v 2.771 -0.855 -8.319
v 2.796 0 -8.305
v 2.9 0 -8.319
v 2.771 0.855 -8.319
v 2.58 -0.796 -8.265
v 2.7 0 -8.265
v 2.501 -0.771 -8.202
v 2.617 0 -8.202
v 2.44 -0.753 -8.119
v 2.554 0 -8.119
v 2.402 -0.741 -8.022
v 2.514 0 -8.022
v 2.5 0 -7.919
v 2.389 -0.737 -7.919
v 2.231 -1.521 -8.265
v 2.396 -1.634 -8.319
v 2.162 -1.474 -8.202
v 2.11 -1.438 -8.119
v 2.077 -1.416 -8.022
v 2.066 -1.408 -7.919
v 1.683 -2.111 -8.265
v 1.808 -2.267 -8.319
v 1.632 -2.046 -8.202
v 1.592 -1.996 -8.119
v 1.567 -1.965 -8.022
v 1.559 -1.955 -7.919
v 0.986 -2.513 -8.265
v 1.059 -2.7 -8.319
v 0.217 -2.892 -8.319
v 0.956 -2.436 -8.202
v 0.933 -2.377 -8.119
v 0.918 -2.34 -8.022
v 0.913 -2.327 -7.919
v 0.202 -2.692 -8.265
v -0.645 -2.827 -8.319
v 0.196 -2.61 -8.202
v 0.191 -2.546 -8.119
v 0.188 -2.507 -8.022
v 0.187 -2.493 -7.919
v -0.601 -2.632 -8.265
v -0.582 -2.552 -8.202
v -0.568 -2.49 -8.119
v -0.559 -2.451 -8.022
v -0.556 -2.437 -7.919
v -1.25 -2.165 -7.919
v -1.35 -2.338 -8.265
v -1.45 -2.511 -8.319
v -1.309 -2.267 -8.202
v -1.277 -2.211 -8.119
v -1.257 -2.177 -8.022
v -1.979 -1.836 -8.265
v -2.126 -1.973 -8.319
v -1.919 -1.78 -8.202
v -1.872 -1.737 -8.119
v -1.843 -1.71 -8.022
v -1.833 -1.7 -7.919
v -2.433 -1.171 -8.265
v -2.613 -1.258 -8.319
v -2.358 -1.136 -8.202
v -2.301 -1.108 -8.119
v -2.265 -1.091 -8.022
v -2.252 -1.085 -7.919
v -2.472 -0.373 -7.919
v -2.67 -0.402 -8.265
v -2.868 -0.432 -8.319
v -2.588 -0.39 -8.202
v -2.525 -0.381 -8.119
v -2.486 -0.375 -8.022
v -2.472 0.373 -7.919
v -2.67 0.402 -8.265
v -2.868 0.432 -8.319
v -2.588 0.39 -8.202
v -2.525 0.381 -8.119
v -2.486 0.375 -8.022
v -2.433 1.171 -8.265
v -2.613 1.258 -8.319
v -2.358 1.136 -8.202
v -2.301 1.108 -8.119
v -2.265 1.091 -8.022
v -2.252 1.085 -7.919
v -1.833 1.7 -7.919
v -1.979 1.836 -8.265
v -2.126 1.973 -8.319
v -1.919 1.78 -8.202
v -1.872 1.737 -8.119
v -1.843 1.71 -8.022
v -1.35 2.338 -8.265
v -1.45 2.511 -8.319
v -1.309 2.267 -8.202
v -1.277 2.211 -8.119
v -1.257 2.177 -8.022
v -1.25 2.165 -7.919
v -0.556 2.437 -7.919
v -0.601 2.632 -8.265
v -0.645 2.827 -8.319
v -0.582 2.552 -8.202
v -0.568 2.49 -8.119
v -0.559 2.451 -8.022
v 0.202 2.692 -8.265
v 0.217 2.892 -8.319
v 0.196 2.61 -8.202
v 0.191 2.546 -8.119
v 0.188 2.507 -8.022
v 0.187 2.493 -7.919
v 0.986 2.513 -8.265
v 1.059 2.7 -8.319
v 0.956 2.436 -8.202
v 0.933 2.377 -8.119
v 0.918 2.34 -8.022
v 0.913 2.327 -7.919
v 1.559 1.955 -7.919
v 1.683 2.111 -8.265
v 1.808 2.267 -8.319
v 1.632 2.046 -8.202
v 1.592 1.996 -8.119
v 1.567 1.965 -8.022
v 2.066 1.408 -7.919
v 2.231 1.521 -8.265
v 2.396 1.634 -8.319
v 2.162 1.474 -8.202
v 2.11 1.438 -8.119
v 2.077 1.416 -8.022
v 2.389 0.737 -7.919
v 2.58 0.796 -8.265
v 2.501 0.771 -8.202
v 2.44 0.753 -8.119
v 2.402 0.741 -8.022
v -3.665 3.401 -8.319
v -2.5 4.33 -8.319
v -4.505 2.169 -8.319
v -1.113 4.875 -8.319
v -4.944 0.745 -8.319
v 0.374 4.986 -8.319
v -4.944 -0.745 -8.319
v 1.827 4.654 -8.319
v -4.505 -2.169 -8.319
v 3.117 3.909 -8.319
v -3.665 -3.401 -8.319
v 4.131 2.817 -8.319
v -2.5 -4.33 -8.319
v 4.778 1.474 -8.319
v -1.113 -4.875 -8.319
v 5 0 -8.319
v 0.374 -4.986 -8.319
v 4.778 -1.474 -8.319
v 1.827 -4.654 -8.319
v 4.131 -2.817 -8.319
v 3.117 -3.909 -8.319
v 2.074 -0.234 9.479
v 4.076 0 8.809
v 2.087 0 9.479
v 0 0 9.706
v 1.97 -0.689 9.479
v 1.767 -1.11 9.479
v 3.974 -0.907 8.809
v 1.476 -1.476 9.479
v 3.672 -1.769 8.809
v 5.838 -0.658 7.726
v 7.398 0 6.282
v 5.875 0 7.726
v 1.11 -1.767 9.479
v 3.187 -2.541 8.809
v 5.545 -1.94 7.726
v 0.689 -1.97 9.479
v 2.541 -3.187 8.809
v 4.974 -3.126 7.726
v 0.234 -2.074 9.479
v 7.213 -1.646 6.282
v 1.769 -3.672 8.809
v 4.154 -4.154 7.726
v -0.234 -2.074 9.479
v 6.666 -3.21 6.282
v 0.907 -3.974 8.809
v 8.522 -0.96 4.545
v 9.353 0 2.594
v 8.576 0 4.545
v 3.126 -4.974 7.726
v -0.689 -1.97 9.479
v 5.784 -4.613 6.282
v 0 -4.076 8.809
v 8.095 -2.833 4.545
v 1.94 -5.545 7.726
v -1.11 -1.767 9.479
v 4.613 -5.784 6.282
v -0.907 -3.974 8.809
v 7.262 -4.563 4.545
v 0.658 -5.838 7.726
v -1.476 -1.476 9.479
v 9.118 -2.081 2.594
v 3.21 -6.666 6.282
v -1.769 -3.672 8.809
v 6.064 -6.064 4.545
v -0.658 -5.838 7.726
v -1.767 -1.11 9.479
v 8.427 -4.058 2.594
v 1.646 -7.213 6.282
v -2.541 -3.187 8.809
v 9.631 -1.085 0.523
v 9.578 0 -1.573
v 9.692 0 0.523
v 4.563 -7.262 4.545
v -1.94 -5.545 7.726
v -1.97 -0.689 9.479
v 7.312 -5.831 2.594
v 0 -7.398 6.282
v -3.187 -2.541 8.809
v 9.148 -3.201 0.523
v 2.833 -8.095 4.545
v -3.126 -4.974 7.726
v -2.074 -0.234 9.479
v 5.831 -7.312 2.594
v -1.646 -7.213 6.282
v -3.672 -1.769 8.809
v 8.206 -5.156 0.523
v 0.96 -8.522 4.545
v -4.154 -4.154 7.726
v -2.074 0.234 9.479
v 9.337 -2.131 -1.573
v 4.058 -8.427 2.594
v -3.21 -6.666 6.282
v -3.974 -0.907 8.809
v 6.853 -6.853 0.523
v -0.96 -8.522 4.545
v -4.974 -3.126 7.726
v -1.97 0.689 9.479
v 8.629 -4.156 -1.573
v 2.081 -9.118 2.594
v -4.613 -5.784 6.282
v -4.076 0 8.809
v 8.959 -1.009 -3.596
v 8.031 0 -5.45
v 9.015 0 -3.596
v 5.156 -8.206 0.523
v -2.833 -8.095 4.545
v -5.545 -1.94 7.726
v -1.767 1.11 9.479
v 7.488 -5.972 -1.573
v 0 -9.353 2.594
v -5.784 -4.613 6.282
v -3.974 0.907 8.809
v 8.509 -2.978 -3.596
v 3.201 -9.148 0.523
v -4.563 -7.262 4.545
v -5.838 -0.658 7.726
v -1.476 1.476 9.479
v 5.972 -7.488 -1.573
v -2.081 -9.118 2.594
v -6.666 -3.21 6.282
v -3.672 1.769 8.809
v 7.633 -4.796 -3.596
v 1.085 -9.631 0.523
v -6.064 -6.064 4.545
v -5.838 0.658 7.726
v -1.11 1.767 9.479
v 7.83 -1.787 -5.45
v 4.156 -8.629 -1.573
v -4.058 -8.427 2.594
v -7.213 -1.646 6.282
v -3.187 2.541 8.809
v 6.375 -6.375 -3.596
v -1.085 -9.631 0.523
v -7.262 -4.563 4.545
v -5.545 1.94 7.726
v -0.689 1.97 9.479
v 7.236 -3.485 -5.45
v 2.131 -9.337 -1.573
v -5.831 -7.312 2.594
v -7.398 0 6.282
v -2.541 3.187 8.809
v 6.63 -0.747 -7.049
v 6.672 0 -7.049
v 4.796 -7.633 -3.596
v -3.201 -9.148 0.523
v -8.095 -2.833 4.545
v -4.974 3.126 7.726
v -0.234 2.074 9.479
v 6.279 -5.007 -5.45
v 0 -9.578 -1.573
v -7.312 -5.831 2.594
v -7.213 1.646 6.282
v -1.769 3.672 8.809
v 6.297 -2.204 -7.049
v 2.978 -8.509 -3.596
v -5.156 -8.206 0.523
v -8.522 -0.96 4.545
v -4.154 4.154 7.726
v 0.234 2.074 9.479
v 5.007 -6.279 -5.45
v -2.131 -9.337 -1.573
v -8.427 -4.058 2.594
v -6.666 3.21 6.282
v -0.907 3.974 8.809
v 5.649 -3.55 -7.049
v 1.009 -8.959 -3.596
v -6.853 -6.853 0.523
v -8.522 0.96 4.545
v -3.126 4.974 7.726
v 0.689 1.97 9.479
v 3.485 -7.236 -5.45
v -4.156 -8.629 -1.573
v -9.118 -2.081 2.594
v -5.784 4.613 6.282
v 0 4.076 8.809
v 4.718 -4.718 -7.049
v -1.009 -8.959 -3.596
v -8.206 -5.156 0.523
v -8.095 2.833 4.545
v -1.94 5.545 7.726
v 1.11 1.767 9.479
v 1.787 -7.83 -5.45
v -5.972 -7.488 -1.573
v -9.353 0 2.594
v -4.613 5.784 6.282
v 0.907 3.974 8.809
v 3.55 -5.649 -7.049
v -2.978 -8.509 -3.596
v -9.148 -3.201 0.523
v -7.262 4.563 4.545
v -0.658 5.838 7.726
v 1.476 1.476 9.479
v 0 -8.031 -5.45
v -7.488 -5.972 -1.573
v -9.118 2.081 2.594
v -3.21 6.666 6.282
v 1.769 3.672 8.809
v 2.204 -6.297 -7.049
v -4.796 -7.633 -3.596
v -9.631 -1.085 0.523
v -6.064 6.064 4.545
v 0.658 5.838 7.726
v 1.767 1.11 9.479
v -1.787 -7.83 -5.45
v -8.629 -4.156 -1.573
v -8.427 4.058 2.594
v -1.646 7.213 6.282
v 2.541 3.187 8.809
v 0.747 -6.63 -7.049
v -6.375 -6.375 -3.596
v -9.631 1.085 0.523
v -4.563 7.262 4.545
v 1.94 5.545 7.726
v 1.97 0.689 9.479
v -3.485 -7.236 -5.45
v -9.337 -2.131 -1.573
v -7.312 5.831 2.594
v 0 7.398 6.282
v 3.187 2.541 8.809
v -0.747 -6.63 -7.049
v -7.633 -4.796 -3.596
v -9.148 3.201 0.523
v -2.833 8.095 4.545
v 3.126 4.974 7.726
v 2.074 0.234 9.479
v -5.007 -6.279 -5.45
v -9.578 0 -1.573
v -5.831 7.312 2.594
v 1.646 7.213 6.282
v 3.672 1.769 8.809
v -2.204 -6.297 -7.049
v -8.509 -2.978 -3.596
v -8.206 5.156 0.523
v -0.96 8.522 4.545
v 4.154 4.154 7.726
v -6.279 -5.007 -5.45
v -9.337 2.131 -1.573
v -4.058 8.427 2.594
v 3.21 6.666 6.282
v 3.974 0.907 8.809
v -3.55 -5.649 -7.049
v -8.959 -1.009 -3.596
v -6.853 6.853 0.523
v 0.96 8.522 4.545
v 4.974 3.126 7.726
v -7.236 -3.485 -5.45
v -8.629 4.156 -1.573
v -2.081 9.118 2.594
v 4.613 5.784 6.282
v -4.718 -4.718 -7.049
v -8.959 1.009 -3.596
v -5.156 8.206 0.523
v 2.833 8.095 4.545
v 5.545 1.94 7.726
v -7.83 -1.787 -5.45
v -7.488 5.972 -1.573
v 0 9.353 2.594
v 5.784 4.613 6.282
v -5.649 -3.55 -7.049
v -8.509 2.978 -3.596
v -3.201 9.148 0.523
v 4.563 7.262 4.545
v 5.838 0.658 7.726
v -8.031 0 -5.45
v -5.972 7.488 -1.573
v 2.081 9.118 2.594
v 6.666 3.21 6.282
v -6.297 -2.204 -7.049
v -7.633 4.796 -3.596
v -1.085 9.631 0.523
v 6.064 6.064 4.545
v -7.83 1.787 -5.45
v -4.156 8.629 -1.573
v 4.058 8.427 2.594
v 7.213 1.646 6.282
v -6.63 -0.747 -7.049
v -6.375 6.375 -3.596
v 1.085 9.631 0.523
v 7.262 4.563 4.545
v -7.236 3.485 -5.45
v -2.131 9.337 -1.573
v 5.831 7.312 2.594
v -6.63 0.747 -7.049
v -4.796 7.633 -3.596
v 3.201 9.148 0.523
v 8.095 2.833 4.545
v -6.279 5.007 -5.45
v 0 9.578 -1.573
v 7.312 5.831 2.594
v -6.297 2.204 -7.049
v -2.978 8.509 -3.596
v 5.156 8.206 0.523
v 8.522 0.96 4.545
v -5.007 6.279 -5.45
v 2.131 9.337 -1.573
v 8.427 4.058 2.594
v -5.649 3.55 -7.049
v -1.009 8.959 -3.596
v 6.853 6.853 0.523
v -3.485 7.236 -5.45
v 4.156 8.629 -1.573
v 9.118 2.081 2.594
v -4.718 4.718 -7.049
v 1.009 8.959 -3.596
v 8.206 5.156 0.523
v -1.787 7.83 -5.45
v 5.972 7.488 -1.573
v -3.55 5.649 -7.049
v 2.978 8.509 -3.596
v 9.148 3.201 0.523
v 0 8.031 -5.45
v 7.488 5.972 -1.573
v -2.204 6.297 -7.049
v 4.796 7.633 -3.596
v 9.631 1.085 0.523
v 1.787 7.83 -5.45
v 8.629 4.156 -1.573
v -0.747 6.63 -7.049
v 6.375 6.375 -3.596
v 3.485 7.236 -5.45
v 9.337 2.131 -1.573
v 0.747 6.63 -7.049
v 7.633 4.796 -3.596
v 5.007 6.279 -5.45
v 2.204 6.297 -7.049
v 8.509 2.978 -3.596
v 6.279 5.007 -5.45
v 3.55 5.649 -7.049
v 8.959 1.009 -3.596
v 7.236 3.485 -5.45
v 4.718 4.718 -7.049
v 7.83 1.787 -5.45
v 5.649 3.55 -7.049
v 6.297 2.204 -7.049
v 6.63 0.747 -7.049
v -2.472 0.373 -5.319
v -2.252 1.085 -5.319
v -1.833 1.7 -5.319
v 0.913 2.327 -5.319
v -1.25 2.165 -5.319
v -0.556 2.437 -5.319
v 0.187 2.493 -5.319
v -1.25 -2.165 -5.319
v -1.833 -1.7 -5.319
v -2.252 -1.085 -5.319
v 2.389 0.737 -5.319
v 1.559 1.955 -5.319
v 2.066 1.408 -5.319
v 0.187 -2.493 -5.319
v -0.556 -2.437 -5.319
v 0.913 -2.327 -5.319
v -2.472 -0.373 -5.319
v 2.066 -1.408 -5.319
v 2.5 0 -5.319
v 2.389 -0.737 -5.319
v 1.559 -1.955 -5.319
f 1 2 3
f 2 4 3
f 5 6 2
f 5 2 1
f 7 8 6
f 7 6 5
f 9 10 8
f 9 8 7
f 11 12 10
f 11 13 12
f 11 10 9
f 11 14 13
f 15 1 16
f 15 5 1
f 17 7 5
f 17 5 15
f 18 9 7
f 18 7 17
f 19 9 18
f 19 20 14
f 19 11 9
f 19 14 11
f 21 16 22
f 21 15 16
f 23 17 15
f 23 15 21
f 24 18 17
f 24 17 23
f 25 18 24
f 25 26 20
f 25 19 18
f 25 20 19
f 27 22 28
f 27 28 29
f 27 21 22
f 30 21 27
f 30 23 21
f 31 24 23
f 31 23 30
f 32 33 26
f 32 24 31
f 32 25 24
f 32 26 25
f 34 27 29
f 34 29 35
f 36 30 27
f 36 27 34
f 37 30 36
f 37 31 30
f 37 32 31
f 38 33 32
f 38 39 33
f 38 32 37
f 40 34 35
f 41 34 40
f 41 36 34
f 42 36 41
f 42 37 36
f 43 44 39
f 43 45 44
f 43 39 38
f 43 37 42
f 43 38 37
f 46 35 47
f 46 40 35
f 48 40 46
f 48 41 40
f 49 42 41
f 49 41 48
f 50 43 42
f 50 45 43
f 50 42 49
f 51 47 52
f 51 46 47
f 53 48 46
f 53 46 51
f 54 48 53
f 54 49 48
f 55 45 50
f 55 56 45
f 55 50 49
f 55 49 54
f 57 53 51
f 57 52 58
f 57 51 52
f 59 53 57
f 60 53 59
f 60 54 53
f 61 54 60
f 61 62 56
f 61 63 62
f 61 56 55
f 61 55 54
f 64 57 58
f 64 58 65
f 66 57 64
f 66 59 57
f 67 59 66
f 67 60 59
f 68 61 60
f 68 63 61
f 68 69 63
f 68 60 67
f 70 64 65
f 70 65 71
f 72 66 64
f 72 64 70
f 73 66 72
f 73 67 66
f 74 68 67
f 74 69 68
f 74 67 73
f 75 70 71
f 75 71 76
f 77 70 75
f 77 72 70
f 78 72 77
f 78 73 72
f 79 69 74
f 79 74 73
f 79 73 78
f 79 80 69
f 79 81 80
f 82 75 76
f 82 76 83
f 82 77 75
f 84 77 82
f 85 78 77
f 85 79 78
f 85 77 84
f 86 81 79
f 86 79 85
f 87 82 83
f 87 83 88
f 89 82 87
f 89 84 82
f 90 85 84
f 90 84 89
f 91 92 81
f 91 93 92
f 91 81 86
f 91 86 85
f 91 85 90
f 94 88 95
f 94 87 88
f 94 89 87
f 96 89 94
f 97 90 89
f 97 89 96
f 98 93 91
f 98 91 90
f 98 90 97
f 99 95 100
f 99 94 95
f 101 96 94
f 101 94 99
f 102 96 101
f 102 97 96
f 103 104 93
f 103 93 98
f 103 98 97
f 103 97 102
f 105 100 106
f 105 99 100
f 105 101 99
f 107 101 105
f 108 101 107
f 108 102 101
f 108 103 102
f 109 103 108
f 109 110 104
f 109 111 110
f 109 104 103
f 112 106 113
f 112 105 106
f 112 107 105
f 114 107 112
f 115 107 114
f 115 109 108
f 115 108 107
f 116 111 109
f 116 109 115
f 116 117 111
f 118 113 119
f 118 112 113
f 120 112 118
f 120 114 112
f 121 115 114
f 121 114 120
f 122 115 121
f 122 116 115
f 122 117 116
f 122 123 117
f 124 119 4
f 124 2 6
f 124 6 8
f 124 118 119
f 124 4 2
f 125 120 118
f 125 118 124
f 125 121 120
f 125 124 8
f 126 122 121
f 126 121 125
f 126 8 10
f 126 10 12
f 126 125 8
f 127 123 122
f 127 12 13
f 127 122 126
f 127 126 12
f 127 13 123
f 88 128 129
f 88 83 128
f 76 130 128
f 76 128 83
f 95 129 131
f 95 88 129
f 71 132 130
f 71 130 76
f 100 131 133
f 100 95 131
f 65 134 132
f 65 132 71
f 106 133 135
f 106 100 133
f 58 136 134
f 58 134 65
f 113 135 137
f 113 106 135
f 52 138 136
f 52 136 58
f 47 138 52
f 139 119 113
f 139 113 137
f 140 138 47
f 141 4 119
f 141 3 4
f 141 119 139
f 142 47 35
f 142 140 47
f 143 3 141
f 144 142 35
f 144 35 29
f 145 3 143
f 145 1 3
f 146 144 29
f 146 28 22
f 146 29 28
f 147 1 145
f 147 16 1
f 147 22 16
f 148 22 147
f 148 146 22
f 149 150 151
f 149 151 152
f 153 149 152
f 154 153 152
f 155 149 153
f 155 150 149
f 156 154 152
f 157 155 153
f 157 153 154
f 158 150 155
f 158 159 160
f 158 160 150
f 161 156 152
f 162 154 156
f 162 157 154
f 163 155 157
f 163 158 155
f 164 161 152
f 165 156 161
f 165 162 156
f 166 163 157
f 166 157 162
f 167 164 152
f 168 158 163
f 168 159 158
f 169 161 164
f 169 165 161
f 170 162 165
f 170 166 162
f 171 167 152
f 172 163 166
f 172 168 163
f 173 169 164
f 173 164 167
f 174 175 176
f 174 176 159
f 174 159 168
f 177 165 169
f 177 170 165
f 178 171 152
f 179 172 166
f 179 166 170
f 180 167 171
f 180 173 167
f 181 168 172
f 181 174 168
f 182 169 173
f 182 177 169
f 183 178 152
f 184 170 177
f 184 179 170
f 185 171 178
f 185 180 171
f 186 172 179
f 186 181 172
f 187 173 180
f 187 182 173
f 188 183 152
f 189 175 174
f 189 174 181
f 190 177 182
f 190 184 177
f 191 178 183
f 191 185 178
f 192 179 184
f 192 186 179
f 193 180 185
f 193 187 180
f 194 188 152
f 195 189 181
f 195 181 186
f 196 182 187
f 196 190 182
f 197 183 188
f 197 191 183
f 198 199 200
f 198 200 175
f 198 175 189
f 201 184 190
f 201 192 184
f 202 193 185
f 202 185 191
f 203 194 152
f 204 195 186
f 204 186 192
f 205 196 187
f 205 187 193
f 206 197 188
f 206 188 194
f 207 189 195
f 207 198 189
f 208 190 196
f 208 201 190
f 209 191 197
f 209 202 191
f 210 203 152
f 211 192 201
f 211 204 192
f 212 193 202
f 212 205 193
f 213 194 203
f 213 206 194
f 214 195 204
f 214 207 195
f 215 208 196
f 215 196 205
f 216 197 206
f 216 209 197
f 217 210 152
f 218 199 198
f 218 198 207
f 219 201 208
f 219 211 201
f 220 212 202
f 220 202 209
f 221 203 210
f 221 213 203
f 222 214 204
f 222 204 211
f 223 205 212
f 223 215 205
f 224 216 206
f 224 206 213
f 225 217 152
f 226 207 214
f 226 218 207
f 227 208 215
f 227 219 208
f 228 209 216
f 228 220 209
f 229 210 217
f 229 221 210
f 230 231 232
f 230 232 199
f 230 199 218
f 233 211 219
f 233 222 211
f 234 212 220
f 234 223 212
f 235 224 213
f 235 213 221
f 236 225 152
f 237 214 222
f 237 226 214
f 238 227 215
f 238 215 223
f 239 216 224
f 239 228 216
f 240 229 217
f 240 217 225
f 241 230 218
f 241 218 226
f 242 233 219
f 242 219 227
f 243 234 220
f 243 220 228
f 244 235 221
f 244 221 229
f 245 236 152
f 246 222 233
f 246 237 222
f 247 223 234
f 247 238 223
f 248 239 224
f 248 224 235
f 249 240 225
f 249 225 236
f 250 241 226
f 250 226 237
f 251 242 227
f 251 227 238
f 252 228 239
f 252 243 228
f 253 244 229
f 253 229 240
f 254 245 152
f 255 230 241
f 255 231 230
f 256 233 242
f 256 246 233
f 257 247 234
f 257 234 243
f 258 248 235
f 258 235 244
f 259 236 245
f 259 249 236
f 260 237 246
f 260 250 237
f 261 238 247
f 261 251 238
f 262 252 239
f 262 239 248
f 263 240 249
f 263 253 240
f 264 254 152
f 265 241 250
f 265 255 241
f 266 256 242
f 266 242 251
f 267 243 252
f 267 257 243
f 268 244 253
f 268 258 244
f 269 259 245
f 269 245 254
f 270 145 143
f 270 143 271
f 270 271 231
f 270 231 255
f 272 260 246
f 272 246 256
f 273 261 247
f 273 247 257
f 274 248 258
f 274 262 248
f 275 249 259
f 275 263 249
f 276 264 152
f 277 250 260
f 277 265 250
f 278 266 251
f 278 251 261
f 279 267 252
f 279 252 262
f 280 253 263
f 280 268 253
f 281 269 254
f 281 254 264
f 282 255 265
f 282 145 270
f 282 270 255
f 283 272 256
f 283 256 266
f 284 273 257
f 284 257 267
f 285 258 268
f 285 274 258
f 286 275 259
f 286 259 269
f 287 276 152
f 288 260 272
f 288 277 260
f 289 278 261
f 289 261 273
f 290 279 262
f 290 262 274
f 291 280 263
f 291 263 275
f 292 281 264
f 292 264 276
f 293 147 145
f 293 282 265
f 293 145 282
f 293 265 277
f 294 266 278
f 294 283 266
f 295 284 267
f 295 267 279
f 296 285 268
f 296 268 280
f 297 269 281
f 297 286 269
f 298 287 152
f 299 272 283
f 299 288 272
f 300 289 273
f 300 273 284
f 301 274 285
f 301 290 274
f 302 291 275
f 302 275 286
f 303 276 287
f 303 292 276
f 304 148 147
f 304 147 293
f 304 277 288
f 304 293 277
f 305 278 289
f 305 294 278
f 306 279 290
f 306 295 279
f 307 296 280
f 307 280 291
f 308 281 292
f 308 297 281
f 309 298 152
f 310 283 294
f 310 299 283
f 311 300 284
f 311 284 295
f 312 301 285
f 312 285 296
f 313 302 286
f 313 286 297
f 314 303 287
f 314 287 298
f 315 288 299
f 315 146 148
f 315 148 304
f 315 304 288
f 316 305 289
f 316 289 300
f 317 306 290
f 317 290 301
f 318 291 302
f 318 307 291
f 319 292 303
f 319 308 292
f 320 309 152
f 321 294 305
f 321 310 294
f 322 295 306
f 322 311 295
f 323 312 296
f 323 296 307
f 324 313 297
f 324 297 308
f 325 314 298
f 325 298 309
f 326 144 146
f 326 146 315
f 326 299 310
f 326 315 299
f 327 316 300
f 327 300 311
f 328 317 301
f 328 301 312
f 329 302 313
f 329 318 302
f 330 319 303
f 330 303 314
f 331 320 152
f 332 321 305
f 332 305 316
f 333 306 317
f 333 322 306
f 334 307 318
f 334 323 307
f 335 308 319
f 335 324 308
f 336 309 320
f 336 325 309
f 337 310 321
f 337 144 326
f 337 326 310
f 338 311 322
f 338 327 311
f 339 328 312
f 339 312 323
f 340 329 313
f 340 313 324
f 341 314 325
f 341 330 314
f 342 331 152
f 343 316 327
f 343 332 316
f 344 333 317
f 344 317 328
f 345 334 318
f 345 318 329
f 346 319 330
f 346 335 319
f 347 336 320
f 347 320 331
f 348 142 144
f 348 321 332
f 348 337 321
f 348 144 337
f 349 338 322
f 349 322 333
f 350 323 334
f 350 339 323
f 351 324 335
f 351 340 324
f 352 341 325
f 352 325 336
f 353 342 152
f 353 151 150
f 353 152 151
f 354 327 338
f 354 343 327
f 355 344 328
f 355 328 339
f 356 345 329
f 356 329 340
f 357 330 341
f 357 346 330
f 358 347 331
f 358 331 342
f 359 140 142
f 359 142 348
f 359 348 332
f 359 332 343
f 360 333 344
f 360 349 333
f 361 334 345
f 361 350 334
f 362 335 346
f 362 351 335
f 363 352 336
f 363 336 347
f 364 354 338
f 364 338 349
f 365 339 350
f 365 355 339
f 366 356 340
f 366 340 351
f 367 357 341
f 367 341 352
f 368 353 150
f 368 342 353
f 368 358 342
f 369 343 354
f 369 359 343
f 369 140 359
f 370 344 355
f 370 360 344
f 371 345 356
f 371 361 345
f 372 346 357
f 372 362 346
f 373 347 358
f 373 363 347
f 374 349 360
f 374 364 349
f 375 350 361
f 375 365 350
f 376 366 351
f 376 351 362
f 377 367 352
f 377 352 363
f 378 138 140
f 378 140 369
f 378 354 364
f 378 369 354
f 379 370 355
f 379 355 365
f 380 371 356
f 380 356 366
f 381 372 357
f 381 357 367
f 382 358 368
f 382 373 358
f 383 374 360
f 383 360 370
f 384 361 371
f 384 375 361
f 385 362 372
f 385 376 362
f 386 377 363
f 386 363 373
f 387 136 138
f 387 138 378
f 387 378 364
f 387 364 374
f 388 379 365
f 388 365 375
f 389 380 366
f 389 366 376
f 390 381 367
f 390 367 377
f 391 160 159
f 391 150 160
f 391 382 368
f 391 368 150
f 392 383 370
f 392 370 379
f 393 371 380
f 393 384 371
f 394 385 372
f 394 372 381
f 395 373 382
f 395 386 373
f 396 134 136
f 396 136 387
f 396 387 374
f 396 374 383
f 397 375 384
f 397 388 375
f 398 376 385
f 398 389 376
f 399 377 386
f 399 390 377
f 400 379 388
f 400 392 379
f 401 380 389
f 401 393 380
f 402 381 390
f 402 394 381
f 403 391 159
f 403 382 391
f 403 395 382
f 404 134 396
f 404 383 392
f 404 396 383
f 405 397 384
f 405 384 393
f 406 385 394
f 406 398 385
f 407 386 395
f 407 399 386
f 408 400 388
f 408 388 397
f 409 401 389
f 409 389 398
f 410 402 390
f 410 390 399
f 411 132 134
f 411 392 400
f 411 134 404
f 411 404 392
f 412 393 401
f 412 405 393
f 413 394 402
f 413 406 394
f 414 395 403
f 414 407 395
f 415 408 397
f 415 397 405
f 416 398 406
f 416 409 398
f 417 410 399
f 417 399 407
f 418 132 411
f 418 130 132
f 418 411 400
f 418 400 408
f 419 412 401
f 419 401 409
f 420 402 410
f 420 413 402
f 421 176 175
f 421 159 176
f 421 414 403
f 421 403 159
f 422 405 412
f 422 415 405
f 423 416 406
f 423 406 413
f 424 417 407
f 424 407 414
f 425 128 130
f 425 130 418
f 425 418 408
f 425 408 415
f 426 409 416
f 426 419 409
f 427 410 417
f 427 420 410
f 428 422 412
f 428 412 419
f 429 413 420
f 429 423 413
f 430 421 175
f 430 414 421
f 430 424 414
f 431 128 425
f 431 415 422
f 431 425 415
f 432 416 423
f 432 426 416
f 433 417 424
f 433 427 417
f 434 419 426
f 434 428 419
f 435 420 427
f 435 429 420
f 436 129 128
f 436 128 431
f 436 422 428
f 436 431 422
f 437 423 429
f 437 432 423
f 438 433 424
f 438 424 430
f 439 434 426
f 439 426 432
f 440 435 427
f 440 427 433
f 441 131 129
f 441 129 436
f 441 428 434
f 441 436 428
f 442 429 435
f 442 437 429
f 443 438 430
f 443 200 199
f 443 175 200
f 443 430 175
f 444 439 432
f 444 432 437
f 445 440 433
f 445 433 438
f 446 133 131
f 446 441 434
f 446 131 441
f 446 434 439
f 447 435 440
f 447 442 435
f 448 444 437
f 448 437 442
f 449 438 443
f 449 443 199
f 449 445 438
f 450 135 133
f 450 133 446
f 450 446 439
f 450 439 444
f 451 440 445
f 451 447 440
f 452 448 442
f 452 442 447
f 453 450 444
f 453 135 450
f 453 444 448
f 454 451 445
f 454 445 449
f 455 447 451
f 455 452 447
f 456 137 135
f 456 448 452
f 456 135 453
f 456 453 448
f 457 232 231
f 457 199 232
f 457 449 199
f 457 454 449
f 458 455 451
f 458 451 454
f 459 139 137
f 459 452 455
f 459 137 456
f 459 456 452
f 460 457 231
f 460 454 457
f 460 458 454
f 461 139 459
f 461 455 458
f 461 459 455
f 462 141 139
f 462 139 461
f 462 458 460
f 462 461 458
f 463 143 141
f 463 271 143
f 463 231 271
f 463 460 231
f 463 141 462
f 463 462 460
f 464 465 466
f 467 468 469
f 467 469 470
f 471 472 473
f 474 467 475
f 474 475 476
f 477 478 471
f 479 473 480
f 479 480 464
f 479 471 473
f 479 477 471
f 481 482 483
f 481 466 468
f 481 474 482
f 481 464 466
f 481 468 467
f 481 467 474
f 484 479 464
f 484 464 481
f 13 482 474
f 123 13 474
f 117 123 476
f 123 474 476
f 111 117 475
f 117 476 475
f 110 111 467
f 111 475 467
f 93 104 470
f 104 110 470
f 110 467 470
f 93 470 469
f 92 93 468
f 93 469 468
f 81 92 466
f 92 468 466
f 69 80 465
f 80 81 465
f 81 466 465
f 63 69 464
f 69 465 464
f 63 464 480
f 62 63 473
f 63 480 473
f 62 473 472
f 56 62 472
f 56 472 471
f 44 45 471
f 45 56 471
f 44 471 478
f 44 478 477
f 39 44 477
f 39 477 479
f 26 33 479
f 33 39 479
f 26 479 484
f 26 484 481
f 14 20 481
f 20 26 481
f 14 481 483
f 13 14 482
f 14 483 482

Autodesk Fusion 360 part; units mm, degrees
sketch "Sketch1" plane through (0, 0, 0) normal (0, 1, 0) x (1, 0, 0)
  circle A0 centre (0, 0) radius 9.7059
  line L0 (0, -9.7059) -> (0, 9.7059)
  dimension "d1" = 19.4118
revolve "Revolve1" add sketch "Sketch1" angle 360 about axis through (0, 0, 9.7059) along (0, 0, -1) contours A0 L0 picked at (2.6606, -2.8528)
sketch "Sketch2" plane through (0, 0, 0) normal (0, 1, 0) x (1, 0, 0)
  circle A0 centre (0, 0) radius 9.7059 construction
  line L0 (0, -9.7059) -> (0, 9.7059)
  line L1 (0, 9.7059) -> (5, 9.7059)
  line L2 (5, 9.7059) -> (5, 8.3189)
  line L3 (5, 8.3189) -> (2.5, 8.3189)
  line L4 (2.5, 8.3189) -> (2.5, 5.3189)
  line L5 (2.5, 5.3189) -> (0, 5.3189)
  dimension "d5" = 2.5
  dimension "d9" = 5
  dimension "d10" = 3
revolve "Revolve2" cut sketch "Sketch2" angle 360 about axis through (0, 0, 9.7059) along (0, 0, -1)
fillet "Fillet1" radius 0.4 1 edges at (-2.3308, -0.904, -8.3189)
equation "d1 = atomsize"
equation "atomsize = ( 110 / ( 170 / 30 ) ) * 1 mm"
equation "a_size = ( ( atomsize * 2 ) / ( ( 6 ) ^ ( 1 / 2 ) ) )"
